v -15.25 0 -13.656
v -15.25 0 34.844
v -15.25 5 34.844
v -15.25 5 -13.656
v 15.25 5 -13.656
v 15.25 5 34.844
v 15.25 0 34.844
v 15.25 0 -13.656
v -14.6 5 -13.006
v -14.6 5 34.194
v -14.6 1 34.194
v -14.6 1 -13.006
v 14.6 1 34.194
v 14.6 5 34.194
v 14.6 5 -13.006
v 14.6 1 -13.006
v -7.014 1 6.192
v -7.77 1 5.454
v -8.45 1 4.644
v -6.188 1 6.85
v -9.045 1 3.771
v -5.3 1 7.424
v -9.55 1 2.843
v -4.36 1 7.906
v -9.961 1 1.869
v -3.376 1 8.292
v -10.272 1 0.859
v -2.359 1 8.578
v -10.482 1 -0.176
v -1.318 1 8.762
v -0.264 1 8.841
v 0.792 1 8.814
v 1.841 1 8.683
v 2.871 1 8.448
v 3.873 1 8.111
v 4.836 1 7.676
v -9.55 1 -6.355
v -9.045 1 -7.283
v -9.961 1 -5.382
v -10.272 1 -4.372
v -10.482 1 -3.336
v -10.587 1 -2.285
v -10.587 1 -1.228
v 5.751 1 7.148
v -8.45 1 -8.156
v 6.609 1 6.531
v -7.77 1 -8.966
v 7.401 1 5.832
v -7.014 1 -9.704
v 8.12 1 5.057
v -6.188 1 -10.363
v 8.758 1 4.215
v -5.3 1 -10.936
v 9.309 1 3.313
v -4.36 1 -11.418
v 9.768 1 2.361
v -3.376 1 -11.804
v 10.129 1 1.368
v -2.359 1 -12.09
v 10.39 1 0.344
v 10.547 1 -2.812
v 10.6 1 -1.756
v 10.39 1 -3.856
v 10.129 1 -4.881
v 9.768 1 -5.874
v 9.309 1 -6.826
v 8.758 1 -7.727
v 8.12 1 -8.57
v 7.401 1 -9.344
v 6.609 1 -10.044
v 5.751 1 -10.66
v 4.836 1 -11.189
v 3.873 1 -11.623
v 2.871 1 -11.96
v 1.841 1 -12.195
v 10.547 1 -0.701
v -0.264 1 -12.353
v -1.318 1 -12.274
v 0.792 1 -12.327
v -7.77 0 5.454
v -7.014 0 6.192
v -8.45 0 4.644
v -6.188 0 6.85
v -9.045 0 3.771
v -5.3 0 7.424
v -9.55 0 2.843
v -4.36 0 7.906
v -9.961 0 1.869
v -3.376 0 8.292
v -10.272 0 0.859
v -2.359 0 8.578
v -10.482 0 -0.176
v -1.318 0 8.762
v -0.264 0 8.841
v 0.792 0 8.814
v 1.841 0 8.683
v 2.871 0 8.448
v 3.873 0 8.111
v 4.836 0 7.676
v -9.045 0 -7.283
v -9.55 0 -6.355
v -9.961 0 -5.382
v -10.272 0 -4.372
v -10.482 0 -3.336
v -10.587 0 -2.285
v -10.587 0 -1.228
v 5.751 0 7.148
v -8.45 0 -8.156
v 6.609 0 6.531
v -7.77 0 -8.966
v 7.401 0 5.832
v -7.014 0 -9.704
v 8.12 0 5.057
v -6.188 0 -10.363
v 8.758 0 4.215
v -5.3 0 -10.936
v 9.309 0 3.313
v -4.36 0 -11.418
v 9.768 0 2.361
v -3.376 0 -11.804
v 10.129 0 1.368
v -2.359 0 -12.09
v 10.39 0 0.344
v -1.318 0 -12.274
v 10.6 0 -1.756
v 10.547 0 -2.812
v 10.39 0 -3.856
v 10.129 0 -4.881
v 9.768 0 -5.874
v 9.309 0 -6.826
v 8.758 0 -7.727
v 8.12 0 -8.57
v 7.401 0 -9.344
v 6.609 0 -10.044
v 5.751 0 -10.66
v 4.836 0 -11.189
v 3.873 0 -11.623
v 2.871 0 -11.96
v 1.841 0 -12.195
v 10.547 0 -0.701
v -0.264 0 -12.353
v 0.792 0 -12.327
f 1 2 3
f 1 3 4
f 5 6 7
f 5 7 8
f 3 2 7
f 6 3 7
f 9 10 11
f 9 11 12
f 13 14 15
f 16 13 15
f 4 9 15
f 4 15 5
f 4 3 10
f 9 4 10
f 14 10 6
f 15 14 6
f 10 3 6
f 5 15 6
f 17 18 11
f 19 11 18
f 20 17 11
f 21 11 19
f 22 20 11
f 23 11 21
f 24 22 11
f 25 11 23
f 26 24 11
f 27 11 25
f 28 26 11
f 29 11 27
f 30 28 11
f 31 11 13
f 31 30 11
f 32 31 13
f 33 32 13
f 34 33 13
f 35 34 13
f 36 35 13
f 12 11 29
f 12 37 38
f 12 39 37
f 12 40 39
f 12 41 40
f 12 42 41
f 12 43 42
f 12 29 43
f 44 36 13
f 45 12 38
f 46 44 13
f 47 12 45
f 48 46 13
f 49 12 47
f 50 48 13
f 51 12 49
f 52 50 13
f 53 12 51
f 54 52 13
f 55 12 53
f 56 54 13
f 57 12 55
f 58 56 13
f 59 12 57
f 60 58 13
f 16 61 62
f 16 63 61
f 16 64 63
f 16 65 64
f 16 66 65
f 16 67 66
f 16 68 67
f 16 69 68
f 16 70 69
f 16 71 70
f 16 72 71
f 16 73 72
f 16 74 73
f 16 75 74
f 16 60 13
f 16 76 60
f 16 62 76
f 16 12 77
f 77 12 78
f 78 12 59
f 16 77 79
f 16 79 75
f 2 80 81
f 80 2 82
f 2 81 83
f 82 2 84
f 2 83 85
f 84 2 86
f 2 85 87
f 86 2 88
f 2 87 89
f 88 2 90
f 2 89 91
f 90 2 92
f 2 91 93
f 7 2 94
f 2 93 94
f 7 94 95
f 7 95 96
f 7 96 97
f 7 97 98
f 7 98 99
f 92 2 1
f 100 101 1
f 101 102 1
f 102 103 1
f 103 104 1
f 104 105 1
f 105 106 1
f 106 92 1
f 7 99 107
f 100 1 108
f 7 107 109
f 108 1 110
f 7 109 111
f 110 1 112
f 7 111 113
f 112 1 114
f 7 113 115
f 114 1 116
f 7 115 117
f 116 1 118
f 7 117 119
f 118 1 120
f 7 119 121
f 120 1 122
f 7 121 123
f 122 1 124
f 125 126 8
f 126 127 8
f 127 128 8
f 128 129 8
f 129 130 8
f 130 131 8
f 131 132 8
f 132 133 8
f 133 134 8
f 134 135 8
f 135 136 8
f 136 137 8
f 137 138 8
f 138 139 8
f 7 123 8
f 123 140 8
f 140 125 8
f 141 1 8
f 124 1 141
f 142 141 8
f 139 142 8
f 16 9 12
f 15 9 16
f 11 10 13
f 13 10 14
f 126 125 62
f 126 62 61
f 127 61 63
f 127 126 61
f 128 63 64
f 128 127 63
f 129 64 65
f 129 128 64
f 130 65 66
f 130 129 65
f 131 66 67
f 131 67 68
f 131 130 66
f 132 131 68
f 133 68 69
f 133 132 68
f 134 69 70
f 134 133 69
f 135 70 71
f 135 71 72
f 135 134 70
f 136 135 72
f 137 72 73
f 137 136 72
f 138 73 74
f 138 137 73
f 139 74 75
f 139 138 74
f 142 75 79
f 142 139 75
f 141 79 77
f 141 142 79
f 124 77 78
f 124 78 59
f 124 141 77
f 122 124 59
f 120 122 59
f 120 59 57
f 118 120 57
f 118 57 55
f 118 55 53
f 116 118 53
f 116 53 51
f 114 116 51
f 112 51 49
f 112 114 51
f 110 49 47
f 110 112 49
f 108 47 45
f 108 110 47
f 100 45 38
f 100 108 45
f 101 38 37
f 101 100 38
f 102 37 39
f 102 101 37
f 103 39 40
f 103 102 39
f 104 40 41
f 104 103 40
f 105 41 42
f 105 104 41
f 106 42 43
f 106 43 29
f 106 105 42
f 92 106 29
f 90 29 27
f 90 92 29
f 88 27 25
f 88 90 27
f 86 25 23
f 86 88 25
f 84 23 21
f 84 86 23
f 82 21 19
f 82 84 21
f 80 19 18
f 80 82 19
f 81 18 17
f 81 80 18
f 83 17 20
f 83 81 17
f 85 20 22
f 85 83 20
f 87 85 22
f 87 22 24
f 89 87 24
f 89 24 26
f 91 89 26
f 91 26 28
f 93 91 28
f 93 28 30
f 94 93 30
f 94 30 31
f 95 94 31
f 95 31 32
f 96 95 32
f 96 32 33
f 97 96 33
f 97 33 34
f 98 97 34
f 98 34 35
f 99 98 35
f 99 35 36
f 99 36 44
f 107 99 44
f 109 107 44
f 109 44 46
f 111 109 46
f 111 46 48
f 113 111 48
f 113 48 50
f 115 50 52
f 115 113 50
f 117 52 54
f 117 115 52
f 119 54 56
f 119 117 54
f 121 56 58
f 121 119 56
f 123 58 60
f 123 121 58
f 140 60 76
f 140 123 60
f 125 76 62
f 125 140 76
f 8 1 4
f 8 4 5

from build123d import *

# Parameters (mm, degrees)
SKETCH1_W           = 61.4
SKETCH1_H           = 48.5
SKETCH1_W_2         = 28.5
SKETCH1_H_2         = 46.5
SKETCH1_W_3         = 28.9
SKETCH1_H_3         = 46.9
BOSS_EXTRUDE1_DEPTH = 35.7
SKETCH2_W           = 29.9
SKETCH2_H           = 48.5
CUT_EXTRUDE1_DEPTH  = 36.7
SKETCH3_W           = 29.2
SKETCH3_H           = 47.2
CUT_EXTRUDE2_DEPTH  = 36.7
SKETCH4_W           = 29.2
SKETCH4_H           = 47.2
SKETCH4_R           = 10.6
BOSS_EXTRUDE2_DEPTH = 1
SKETCH6_W           = 1
SKETCH6_H           = 48.5
CUT_EXTRUDE3_DEPTH  = 36.7
SKETCH7_W           = 30.5
SKETCH7_H           = 30.7
CUT_EXTRUDE4_DEPTH  = 49.5


with BuildPart() as part:
    # Sketch1 → Boss-Extrude1 (new body)
    with BuildSketch(Plane(origin=(0, 0, 0), x_dir=(1, 0, 0), z_dir=(0, 1, 0))):
        with Locations((15.45, -10.593857338)):
            Rectangle(SKETCH1_W, SKETCH1_H)
        with Locations((0, -10.593857338)):
            Rectangle(SKETCH1_W_2, SKETCH1_H_2, mode=Mode.SUBTRACT)
        with Locations((29.7, -10.593857338)):
            Rectangle(SKETCH1_W_3, SKETCH1_H_3, mode=Mode.SUBTRACT)
    extrude(amount=BOSS_EXTRUDE1_DEPTH)

    # Sketch2 → Cut-Extrude1 (cut, through all)
    with BuildSketch(Plane(origin=(0, 35.7, 0), x_dir=(1, 0, 0), z_dir=(0, 1, 0))):
        with Locations((31.2, -10.593857338)):
            Rectangle(SKETCH2_W, SKETCH2_H)
    extrude(amount=-CUT_EXTRUDE1_DEPTH, mode=Mode.SUBTRACT)

    # Sketch3 → Cut-Extrude2 (cut, through all)
    with BuildSketch(Plane(origin=(0, 35.7, 0), x_dir=(1, 0, 0), z_dir=(0, 1, 0))):
        with Locations((0, -10.593857338)):
            Rectangle(SKETCH3_W, SKETCH3_H)
    extrude(amount=-CUT_EXTRUDE2_DEPTH, mode=Mode.SUBTRACT)

    # Sketch4 → Boss-Extrude2 (add)
    with BuildSketch(Plane(origin=(0, 0, 0), x_dir=(1, 0, 0), z_dir=(0, 1, 0))):
        with Locations((0, -10.593857338)):
            Rectangle(SKETCH4_W, SKETCH4_H)
        with Locations((0, 1.756142662)):
            Circle(SKETCH4_R, mode=Mode.SUBTRACT)
    extrude(amount=BOSS_EXTRUDE2_DEPTH)

    # Sketch6 → Cut-Extrude3 (cut, through all)
    with BuildSketch(Plane(origin=(0, 35.7, 0), x_dir=(1, 0, 0), z_dir=(0, 1, 0))):
        with Locations((15.75, -10.593857338)):
            Rectangle(SKETCH6_W, SKETCH6_H)
    extrude(amount=-CUT_EXTRUDE3_DEPTH, mode=Mode.SUBTRACT)

    # Sketch7 → Cut-Extrude4 (cut, through all)
    with BuildSketch(Plane.XY.offset(34.843857338)):
        with Locations((0, 20.35)):
            Rectangle(SKETCH7_W, SKETCH7_H)
    extrude(amount=-CUT_EXTRUDE4_DEPTH, mode=Mode.SUBTRACT)


solid = part.part
